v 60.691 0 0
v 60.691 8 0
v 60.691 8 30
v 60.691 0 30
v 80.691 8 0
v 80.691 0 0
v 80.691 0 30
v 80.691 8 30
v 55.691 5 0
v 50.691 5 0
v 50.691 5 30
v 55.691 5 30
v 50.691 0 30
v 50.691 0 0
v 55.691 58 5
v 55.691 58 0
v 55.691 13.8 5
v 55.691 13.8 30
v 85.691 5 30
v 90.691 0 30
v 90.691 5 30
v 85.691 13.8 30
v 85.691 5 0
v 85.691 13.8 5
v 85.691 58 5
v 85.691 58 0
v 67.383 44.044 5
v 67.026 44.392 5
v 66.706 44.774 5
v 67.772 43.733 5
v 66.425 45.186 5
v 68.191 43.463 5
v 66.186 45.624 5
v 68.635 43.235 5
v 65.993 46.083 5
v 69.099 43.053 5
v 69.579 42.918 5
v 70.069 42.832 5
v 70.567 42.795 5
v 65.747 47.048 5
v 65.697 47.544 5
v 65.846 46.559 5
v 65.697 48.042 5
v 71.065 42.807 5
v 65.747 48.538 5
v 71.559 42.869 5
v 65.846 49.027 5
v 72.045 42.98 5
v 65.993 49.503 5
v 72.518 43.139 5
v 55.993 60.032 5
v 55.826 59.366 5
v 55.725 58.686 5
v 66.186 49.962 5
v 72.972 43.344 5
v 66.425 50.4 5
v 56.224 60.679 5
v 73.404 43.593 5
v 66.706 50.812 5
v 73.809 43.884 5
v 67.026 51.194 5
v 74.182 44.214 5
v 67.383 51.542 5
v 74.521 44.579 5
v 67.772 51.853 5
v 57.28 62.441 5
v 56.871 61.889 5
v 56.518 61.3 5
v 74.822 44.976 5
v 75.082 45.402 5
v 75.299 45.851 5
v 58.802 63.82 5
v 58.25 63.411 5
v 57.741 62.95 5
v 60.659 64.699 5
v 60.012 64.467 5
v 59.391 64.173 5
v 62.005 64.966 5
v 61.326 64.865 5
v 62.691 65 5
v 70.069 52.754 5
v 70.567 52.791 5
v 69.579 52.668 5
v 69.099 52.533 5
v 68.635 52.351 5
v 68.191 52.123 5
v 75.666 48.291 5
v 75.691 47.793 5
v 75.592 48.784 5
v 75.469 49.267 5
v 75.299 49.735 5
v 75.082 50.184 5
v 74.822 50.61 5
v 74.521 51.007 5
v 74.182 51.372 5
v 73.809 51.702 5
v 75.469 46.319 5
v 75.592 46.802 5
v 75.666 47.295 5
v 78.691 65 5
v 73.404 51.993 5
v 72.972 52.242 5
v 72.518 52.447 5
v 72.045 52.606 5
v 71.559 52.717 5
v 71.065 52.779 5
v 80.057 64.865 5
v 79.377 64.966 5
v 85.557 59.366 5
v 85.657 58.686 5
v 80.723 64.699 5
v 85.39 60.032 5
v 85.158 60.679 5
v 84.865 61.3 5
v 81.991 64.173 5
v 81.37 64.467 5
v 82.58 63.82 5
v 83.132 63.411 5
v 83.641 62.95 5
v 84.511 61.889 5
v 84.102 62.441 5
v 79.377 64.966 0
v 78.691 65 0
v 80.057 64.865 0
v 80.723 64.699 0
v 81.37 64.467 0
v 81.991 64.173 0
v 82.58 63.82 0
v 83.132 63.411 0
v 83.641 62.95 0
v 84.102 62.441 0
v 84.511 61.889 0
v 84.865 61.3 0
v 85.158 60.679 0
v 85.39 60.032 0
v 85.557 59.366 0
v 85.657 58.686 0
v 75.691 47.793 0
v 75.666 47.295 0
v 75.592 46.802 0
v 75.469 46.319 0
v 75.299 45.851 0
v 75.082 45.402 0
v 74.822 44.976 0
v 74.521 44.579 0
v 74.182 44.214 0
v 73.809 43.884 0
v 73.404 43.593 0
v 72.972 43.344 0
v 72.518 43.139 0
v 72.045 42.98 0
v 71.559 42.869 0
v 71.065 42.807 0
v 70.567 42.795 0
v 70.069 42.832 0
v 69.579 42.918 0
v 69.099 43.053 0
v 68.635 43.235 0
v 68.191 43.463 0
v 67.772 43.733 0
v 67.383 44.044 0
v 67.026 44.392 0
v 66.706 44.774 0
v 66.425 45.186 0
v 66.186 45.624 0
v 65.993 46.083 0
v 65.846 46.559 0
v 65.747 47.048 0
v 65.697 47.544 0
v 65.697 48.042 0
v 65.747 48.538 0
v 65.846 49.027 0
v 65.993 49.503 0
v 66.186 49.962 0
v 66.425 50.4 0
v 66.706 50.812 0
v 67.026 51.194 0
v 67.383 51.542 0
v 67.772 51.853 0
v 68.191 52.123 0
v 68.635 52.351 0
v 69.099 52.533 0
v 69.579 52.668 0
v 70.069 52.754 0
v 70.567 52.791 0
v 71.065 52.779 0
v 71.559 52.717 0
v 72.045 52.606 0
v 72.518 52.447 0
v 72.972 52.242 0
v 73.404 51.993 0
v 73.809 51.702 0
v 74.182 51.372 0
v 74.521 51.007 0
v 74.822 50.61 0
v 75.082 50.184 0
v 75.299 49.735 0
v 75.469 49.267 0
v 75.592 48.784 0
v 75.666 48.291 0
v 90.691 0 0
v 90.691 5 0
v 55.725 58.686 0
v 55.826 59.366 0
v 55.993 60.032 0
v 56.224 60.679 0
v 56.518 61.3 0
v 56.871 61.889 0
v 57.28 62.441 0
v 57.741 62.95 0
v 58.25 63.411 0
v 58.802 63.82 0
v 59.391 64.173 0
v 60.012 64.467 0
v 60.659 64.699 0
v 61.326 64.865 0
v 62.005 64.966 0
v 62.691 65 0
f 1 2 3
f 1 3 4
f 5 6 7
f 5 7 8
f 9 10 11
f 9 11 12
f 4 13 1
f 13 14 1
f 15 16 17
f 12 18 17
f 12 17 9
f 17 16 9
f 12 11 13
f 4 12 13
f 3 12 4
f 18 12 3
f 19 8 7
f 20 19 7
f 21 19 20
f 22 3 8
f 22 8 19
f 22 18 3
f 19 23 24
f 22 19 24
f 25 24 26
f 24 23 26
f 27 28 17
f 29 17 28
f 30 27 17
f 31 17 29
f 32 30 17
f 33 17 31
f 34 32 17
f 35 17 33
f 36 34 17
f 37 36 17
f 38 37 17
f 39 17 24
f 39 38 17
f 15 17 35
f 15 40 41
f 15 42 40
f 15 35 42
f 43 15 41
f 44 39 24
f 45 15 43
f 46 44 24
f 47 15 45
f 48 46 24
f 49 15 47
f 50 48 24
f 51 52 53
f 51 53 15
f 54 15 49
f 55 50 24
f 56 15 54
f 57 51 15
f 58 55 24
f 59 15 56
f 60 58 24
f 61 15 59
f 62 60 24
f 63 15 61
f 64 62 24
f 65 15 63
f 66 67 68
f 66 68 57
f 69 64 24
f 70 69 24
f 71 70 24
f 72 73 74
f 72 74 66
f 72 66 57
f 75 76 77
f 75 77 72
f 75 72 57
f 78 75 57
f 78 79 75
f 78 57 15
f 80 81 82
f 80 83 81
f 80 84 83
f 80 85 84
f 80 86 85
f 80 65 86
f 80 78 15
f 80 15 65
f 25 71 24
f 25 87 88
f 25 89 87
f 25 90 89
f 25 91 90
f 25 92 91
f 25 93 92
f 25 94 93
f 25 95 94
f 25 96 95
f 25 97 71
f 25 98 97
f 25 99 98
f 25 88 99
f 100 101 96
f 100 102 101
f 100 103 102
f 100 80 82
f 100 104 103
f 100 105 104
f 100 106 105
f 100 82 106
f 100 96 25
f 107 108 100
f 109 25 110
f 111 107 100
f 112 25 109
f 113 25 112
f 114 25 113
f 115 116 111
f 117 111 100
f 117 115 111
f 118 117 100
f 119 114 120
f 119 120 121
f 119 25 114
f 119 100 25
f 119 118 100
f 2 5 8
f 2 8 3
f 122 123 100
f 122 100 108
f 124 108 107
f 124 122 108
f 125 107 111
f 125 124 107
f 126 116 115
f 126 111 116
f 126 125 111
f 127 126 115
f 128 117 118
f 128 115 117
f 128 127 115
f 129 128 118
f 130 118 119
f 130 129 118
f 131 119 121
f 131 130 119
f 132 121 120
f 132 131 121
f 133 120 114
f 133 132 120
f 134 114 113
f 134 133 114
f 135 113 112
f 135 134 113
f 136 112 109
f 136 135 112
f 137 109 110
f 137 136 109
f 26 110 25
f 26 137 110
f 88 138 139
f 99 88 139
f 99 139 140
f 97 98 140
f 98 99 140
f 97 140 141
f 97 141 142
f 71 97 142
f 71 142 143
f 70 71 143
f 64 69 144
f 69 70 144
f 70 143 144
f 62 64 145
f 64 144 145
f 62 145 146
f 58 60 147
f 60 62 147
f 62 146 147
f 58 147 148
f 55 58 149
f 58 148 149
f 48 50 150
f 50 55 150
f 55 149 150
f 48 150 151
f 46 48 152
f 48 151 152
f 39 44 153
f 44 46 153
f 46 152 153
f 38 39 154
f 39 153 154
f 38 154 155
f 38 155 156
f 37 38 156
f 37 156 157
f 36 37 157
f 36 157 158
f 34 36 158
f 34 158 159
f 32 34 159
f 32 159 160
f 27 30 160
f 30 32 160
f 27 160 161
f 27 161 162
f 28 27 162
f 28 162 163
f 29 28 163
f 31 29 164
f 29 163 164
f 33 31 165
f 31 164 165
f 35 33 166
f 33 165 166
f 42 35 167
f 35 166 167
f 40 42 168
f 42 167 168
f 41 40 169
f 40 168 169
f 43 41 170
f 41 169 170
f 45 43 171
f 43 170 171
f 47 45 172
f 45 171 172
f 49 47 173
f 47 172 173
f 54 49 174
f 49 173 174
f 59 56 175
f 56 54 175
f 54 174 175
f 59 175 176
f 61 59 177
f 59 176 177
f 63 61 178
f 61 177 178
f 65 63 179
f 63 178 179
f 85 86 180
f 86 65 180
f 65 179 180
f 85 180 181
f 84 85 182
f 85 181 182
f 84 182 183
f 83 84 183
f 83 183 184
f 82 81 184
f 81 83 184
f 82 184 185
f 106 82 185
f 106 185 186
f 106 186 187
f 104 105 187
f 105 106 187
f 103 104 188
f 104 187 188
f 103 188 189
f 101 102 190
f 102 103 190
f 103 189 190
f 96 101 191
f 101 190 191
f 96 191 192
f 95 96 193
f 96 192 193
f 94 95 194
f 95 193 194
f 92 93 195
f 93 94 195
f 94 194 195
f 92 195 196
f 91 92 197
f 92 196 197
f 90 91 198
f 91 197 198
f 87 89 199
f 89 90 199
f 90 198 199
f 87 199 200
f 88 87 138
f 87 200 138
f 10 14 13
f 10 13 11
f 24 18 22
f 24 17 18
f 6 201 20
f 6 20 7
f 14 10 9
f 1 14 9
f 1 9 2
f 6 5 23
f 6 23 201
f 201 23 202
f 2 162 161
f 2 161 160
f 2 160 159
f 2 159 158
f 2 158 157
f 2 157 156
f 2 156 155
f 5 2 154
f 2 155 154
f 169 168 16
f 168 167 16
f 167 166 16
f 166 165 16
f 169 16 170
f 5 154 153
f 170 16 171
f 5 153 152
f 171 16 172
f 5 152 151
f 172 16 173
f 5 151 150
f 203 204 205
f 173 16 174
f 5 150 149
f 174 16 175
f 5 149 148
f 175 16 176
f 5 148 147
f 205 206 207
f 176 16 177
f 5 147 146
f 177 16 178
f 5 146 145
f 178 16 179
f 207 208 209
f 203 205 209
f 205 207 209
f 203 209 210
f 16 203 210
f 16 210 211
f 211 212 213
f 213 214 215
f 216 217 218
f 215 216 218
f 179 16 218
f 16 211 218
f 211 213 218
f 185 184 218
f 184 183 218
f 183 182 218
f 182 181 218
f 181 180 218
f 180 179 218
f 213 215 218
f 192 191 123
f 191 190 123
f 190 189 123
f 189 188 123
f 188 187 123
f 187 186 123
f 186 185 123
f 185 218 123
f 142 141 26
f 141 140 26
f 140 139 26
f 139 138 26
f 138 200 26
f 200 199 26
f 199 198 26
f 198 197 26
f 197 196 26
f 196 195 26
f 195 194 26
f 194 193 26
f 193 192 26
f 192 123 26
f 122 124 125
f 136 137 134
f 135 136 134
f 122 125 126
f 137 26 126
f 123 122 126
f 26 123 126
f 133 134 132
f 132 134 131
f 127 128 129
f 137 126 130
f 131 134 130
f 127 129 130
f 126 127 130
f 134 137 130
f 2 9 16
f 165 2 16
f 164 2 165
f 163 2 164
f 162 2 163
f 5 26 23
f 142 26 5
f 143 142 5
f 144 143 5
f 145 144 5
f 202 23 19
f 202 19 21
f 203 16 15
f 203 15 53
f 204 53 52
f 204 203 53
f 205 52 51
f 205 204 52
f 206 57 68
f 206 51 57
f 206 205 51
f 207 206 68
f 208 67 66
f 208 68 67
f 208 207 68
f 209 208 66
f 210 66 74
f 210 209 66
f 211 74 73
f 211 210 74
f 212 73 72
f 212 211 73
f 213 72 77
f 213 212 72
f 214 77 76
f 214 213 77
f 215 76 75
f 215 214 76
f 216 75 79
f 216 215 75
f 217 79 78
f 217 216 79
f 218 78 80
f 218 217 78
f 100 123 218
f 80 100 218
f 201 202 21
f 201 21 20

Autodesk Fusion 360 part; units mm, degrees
sketch "Sketch1" plane through (0, 0, 0) normal (0, 0, 1) x (1, 0, 0)
  line L0 (85.6912, 5) -> (85.6912, 58)
  line L1 (55.6912, 58) -> (55.6912, 5)
  line L2 (80.6912, 0) -> (80.6912, 8)
  line L3 (80.6912, 8) -> (60.6912, 8)
  line L4 (60.6912, 8) -> (60.6912, 0)
  line L5 (78.6912, 65) -> (62.6912, 65)
  line L6 (50.6912, 0) -> (60.6912, 0)
  circle A0 centre (70.6912, 47.793) radius 5
  line L7 (70.6912, 65) -> (70.6912, 26.651) construction
  line L8 (50.6912, 0) -> (50.6912, 5)
  line L9 (55.6912, 13.8) -> (85.6912, 13.8)
  line L10 (90.6912, 5) -> (90.6912, 0)
  line L11 (90.6912, 0) -> (80.6912, 0)
  line L12 (50.6912, 5) -> (55.6912, 5)
  line L13 (85.6912, 5) -> (90.6912, 5)
  arc A1 (62.6912, 65) -> (55.6912, 58) centre (62.6912, 58) ccw
  arc A2 (85.6912, 58) -> (78.6912, 65) centre (78.6912, 58) ccw
  dimension "d1" = 20
  dimension "d2" = 8
  dimension "d9" = 10
  dimension "d12" = 5.8
  dimension "d13" = 10
  dimension "d14" = 10
  dimension "d15" = 5
  dimension "d16" = 5
  dimension "d17" = 5
  dimension "d18" = 5
  dimension "d19" = 47.793
  dimension "d20" = 65
  dimension "d21" = 7
extrude "Extrude1" add sketch "Sketch1" along normal blind 5 contours L0 L1 L5 L9 A1 A2
extrude "Extrude2" add sketch "Sketch1" along normal blind 30 contours L0 L1 L2 L3 L4 L6 L8 L9 L10 L11 L12 L13
sketch "Sketch2" plane through (0, 13.8, 0) normal (0, 1, 0) x (-1, 0, 0)
  line L0 (-85.6912, 5) -> (-55.6912, 5)
  line L1 (-55.6912, 5) -> (-55.6912, 30)
  line L2 (-55.6912, 30) -> (-85.6912, 30)
  line L3 (-85.6912, 30) -> (-85.6912, 5)
  line L4 (-63.185, 12.5052) -> (-78.185, 12.5052) construction
  line L5 (-78.185, 12.5052) -> (-78.185, 22.5052) construction
  line L6 (-78.185, 22.5052) -> (-63.185, 22.5052) construction
  line L7 (-63.185, 22.5052) -> (-63.185, 12.5052) construction
  line L8 (-70.685, 17.4948) -> (-70.685, 17.5052)
  circle A0 centre (-63.185, 12.5052) radius 1.5
  circle A1 centre (-78.185, 12.5052) radius 1.5
  circle A2 centre (-78.185, 22.5052) radius 1.5
  circle A3 centre (-63.185, 22.5052) radius 1.5
  dimension "d26" = 15
  dimension "d27" = 10
  dimension "d28" = 3
extrude "Extrude3" cut sketch "Sketch2" along normal through all contours A0 | A1 | A2 | A3
